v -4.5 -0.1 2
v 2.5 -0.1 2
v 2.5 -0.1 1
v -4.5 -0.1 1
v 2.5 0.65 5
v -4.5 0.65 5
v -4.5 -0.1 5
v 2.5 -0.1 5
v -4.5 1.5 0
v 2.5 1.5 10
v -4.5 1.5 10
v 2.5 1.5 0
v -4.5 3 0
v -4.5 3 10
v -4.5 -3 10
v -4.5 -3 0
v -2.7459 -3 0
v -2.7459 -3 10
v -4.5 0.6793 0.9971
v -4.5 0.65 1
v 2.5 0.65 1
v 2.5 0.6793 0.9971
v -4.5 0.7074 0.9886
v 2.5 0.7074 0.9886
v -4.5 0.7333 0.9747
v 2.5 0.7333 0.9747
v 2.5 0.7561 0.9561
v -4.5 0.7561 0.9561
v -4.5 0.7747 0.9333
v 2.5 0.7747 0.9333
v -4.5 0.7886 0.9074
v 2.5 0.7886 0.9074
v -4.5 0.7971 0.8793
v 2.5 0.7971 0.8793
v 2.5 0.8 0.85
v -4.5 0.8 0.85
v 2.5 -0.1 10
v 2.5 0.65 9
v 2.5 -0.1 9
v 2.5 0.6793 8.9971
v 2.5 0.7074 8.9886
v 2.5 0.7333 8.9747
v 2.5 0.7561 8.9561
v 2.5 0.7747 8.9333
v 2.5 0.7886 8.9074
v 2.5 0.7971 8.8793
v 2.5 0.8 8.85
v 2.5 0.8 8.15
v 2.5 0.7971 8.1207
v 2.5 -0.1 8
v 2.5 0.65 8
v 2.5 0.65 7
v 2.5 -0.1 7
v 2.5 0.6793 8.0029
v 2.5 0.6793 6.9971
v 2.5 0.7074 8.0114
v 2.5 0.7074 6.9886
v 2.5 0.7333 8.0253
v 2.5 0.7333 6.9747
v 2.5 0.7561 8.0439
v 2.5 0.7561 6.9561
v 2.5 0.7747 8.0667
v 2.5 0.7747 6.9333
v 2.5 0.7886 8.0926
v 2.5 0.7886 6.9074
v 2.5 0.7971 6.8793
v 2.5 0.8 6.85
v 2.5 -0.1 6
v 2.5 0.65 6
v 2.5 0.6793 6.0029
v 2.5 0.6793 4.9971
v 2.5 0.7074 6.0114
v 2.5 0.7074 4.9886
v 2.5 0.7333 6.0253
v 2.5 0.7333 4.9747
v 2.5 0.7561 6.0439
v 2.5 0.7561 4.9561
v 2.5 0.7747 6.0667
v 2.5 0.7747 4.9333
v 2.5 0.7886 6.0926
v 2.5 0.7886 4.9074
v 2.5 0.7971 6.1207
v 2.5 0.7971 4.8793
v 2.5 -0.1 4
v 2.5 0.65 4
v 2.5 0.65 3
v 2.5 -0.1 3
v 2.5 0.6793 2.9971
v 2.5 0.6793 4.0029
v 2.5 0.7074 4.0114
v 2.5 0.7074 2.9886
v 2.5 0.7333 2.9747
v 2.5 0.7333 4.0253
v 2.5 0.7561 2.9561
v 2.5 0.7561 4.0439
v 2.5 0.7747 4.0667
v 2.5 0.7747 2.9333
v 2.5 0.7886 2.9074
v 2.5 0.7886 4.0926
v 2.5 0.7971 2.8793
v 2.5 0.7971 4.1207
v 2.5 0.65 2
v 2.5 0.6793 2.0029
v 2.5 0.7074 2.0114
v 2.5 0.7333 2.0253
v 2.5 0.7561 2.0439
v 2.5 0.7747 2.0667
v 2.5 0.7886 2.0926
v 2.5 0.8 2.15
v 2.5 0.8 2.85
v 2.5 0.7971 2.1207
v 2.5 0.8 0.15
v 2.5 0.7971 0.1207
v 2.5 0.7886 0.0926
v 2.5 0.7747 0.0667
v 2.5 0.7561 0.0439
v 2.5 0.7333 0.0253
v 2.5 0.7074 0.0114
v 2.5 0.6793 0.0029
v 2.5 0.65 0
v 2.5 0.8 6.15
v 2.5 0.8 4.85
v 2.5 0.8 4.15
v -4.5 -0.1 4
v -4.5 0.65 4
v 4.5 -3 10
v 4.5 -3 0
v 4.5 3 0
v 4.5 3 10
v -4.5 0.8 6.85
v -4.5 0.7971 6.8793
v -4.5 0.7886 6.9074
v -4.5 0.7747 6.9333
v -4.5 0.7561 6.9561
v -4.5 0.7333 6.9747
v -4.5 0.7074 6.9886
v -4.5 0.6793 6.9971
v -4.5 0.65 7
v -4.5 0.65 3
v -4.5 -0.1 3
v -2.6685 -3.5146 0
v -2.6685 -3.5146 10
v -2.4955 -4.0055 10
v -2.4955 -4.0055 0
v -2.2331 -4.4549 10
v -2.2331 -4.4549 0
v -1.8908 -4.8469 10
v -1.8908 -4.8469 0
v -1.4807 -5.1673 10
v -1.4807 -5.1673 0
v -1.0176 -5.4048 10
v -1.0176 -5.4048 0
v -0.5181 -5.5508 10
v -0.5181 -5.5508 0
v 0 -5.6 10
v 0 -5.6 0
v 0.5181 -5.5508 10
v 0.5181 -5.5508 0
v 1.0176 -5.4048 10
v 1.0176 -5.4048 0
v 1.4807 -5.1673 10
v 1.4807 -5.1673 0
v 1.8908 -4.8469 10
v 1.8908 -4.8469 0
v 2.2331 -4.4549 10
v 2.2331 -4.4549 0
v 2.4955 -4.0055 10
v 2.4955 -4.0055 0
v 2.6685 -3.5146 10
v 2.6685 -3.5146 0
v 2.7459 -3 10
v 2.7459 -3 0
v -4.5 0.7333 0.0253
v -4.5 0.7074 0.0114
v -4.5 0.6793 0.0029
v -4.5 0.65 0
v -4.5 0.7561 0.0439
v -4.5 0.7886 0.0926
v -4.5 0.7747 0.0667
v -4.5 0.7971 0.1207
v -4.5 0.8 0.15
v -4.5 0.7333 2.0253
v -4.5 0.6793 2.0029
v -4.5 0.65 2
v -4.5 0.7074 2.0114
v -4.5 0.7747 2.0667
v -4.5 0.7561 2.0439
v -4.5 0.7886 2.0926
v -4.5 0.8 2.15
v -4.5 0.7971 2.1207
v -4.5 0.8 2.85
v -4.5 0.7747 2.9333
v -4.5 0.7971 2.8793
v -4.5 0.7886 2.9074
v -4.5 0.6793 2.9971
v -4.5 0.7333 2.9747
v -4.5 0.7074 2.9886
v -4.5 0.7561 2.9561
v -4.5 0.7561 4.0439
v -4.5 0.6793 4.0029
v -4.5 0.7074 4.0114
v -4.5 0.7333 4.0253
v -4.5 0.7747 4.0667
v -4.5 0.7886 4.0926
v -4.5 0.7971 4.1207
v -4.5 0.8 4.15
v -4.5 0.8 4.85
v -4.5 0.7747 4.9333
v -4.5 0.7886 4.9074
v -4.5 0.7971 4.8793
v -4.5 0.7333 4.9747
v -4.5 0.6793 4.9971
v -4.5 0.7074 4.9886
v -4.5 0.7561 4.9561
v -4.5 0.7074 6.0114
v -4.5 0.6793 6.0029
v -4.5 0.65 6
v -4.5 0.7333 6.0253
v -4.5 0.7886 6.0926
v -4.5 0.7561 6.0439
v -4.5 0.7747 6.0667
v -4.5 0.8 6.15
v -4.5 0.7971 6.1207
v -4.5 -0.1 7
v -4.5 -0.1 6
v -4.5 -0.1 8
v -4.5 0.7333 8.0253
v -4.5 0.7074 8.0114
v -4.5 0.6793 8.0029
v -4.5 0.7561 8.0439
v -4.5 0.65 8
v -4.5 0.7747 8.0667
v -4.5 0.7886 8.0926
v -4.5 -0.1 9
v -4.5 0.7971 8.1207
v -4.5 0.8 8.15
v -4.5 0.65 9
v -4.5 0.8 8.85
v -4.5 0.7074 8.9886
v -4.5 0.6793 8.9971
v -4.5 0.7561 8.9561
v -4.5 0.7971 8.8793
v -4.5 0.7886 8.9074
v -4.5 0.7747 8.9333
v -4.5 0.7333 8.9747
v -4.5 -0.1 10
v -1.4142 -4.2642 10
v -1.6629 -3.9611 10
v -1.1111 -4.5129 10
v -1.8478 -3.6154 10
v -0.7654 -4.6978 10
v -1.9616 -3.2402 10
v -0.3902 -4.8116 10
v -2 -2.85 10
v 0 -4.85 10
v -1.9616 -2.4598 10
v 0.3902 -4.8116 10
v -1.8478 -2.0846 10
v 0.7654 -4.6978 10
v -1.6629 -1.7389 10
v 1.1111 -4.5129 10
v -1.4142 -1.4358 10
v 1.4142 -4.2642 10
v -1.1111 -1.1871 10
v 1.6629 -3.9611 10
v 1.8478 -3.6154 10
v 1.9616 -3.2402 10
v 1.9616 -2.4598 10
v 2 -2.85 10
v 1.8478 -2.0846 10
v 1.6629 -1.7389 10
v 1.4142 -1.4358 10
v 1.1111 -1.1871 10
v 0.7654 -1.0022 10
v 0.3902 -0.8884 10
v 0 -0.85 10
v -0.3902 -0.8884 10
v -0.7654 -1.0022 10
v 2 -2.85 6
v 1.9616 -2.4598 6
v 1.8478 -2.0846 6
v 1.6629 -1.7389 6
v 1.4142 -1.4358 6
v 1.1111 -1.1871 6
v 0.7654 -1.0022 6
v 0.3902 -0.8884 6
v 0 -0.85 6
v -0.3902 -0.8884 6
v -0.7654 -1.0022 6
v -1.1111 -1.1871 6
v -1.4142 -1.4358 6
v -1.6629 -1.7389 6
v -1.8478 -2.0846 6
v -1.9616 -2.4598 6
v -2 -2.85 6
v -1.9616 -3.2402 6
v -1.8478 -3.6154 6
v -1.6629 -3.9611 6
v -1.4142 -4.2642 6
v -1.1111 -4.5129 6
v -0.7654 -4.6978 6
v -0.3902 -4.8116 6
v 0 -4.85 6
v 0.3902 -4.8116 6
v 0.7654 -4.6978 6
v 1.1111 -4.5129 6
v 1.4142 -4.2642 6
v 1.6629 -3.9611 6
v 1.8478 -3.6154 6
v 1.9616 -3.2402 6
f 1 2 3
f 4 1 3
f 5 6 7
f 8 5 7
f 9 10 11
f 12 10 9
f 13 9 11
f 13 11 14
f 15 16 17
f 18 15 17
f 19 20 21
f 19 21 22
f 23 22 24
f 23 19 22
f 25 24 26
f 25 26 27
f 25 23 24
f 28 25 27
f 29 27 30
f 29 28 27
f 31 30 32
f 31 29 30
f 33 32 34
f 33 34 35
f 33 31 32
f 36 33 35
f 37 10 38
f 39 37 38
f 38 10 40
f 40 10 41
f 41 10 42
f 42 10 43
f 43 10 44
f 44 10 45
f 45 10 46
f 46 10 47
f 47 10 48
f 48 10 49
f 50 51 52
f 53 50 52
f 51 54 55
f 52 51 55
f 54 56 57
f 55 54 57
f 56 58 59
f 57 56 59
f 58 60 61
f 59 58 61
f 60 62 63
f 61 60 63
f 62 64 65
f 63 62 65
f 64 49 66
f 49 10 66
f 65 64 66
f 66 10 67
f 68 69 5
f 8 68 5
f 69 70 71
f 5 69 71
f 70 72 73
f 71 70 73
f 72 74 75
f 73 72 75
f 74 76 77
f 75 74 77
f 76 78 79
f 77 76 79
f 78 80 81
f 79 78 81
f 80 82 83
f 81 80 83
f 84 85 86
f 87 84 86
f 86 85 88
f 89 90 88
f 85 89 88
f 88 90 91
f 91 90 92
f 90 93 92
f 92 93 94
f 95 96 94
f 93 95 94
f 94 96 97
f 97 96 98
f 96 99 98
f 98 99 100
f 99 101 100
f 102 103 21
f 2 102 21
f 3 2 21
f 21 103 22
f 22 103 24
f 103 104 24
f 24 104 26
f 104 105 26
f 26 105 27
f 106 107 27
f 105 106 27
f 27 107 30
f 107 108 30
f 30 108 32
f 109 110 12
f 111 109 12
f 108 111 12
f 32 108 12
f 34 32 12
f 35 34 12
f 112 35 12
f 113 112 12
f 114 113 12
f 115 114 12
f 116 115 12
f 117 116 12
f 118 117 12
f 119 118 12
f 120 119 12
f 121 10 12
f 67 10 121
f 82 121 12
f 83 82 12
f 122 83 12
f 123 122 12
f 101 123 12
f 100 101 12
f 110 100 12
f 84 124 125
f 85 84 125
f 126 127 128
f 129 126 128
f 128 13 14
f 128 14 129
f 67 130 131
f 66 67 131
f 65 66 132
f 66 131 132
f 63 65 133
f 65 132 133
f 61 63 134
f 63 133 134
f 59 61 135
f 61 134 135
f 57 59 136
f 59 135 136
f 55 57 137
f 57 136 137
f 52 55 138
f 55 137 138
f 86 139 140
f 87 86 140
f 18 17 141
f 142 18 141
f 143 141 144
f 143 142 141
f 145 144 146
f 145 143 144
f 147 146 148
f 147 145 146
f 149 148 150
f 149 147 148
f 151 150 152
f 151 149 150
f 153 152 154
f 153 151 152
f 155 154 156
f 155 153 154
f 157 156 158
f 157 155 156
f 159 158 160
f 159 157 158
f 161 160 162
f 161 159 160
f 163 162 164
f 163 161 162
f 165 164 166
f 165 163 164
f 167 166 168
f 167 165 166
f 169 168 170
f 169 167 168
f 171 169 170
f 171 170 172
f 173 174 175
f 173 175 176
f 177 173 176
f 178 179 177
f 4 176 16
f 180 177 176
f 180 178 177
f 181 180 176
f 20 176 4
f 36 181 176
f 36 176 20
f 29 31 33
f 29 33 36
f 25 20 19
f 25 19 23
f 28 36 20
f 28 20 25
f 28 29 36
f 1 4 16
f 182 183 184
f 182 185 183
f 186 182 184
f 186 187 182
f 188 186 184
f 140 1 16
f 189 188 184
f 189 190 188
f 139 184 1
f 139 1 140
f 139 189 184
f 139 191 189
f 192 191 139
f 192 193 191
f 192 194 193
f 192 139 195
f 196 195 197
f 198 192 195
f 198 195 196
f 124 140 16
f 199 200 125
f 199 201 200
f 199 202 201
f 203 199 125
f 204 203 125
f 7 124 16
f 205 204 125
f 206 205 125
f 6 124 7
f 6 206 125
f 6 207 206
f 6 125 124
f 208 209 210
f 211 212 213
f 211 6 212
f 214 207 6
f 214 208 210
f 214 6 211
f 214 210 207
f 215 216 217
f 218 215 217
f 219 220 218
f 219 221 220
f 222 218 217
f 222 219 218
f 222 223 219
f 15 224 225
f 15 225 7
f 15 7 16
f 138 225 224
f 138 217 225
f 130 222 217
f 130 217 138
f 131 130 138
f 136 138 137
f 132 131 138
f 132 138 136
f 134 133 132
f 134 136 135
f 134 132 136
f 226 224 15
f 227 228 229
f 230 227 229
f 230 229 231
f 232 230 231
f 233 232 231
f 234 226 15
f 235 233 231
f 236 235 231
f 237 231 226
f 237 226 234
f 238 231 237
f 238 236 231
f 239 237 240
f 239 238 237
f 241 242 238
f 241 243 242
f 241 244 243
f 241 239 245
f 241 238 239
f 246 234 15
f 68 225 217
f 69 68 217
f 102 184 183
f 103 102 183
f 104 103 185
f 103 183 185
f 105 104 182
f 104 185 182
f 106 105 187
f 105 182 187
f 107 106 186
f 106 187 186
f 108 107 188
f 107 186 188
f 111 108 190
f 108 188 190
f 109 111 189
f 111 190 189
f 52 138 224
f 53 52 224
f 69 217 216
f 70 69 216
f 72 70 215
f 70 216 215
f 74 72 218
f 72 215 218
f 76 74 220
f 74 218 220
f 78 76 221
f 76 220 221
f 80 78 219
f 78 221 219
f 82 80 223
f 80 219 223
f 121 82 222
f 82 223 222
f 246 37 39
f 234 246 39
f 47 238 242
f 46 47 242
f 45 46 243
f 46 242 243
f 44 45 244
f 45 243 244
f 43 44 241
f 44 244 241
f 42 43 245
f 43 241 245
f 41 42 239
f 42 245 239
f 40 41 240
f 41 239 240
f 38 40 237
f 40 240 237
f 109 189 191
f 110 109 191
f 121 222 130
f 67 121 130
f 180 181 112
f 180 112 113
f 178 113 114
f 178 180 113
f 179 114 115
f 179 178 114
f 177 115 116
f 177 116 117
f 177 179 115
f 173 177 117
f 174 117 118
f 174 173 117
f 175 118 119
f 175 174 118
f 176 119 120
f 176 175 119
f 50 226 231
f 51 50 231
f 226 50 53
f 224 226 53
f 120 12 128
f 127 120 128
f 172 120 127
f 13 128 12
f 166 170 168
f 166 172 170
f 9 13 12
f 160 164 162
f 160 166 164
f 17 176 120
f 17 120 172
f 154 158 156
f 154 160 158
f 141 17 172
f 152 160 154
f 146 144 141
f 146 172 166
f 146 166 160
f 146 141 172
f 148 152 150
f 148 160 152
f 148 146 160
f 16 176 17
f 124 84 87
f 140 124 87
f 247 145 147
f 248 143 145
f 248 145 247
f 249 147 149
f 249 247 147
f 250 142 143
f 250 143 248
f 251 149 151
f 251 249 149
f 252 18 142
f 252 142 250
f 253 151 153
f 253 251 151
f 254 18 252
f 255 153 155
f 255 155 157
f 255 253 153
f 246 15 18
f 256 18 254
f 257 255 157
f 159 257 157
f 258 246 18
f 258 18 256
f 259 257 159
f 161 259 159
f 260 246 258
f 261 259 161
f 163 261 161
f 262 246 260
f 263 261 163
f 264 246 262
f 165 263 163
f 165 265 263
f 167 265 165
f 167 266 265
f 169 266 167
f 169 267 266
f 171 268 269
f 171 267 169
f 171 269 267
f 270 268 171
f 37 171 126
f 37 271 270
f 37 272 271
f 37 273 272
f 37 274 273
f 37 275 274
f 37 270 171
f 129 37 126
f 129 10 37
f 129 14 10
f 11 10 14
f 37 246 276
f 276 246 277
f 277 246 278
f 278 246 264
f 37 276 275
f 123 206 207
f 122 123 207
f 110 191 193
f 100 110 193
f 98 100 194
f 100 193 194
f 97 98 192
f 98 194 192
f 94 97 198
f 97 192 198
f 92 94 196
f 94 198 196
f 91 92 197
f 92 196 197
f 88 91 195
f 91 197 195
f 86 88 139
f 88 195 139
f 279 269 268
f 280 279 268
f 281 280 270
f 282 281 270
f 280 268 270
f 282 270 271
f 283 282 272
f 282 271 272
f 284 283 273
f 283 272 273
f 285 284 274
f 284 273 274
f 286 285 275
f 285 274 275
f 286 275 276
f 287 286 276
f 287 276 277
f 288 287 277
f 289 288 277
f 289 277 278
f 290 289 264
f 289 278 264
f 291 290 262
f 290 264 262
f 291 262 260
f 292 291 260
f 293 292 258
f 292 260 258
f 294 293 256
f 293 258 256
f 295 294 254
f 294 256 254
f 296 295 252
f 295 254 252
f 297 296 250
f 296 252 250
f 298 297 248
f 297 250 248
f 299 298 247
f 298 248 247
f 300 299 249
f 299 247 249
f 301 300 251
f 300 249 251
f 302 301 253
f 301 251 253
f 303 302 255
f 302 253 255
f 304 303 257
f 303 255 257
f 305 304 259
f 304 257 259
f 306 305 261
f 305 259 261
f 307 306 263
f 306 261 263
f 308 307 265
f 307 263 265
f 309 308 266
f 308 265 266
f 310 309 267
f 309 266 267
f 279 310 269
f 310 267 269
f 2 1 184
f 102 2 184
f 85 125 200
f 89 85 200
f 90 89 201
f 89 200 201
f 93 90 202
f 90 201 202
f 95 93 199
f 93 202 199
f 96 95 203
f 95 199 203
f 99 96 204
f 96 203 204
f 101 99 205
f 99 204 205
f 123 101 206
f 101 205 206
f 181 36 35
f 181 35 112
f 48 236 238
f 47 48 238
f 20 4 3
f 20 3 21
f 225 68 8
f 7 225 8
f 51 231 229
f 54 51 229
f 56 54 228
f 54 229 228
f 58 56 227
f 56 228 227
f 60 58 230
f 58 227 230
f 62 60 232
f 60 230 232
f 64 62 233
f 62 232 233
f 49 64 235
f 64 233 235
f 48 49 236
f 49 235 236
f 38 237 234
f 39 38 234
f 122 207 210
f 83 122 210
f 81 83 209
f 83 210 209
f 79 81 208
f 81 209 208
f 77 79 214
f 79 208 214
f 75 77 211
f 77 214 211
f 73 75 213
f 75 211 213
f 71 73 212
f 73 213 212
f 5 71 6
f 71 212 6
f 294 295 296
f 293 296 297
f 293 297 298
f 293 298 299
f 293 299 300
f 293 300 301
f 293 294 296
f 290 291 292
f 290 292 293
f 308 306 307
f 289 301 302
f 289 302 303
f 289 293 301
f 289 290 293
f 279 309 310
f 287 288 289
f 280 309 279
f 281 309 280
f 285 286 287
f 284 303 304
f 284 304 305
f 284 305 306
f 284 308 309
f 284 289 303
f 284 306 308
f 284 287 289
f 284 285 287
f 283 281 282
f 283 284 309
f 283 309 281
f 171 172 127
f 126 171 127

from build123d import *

# Parameters (mm, degrees)
SKETCH1_W           = 9
SKETCH1_H           = 6
BOSS_EXTRUDE1_DEPTH = 10
CUT_EXTRUDE1_START  = -2
SKETCH2_W           = 10
SKETCH2_H           = 1.6
CUT_EXTRUDE1_DEPTH  = 7
SKETCH3_R           = 2.75
BOSS_EXTRUDE2_DEPTH = 10
SKETCH4_R           = 2
CUT_EXTRUDE2_DEPTH  = 4
BOSS_EXTRUDE3_REACH = 16.573


with BuildPart() as part:
    # Sketch1 → Boss-Extrude1 (new body)
    with BuildSketch(Plane.XY):
        Rectangle(SKETCH1_W, SKETCH1_H)
    extrude(amount=BOSS_EXTRUDE1_DEPTH)

    # Sketch2 → Cut-Extrude1 (cut)
    with BuildSketch(Plane(origin=(4.5, 0, 0), x_dir=(0, 0, -1), z_dir=(1, 0, 0)).offset(CUT_EXTRUDE1_START)):
        with Locations((-5, 0.7)):
            Rectangle(SKETCH2_W, SKETCH2_H)
    extrude(amount=-CUT_EXTRUDE1_DEPTH, mode=Mode.SUBTRACT)

    # Sketch3 → Boss-Extrude2 (add, through all)
    with BuildSketch(Plane.XY.offset(10)):
        with Locations((0, -2.85)):
            Circle(SKETCH3_R)
    extrude(amount=-BOSS_EXTRUDE2_DEPTH)

    # Sketch4 → Cut-Extrude2 (cut)
    with BuildSketch(Plane.XY.offset(10)):
        with Locations((0, -2.85)):
            Circle(SKETCH4_R)
    extrude(amount=-CUT_EXTRUDE2_DEPTH, mode=Mode.SUBTRACT)

    # Sketch5 → Boss-Extrude3 (add, up to next)
    with BuildSketch(Plane.ZY.offset(4.5), mode=Mode.PRIVATE) as boss_extrude3_sk1:
        with BuildLine():
            Line((0, -0.1), (1, -0.1))
            Line((1, -0.1), (1, 0.65))
            ThreePointArc((1, 0.65), (0.956066017, 0.756066017), (0.85, 0.8))
            Line((0.85, 0.8), (0.15, 0.8))
            ThreePointArc((0.15, 0.8), (0.043933983, 0.756066017), (0, 0.65))
            Line((0, 0.65), (0, -0.1))
        make_face()
    boss_extrude3_tool1 = extrude(boss_extrude3_sk1.sketch, amount=-BOSS_EXTRUDE3_REACH, mode=Mode.PRIVATE) - part.part
    # Sketch5 → Boss-Extrude3 (add, up to next)
    with BuildSketch(Plane.ZY.offset(4.5), mode=Mode.PRIVATE) as boss_extrude3_sk2:
        with BuildLine():
            Line((2, -0.1), (2, 0.65))
            ThreePointArc((2, 0.65), (2.043933983, 0.756066017), (2.15, 0.8))
            Line((2.15, 0.8), (2.85, 0.8))
            ThreePointArc((2.85, 0.8), (2.956066017, 0.756066017), (3, 0.65))
            Line((3, 0.65), (3, -0.1))
            Line((3, -0.1), (2, -0.1))
        make_face()
    boss_extrude3_tool2 = extrude(boss_extrude3_sk2.sketch, amount=-BOSS_EXTRUDE3_REACH, mode=Mode.PRIVATE) - part.part
    # Sketch5 → Boss-Extrude3 (add, up to next)
    with BuildSketch(Plane.ZY.offset(4.5), mode=Mode.PRIVATE) as boss_extrude3_sk3:
        with BuildLine():
            Line((4, -0.1), (4, 0.65))
            ThreePointArc((4, 0.65), (4.043933983, 0.756066017), (4.15, 0.8))
            Line((4.15, 0.8), (4.85, 0.8))
            ThreePointArc((4.85, 0.8), (4.956066017, 0.756066017), (5, 0.65))
            Line((5, 0.65), (5, -0.1))
            Line((5, -0.1), (4, -0.1))
        make_face()
    boss_extrude3_tool3 = extrude(boss_extrude3_sk3.sketch, amount=-BOSS_EXTRUDE3_REACH, mode=Mode.PRIVATE) - part.part
    # Sketch5 → Boss-Extrude3 (add, up to next)
    with BuildSketch(Plane.ZY.offset(4.5), mode=Mode.PRIVATE) as boss_extrude3_sk4:
        with BuildLine():
            Line((6, -0.1), (6, 0.65))
            ThreePointArc((6, 0.65), (6.043933983, 0.756066017), (6.15, 0.8))
            Line((6.15, 0.8), (6.85, 0.8))
            ThreePointArc((6.85, 0.8), (6.956066017, 0.756066017), (7, 0.65))
            Line((7, 0.65), (7, -0.1))
            Line((7, -0.1), (6, -0.1))
        make_face()
    boss_extrude3_tool4 = extrude(boss_extrude3_sk4.sketch, amount=-BOSS_EXTRUDE3_REACH, mode=Mode.PRIVATE) - part.part
    # Sketch5 → Boss-Extrude3 (add, up to next)
    with BuildSketch(Plane.ZY.offset(4.5), mode=Mode.PRIVATE) as boss_extrude3_sk5:
        with BuildLine():
            Line((8, -0.1), (8, 0.65))
            ThreePointArc((8, 0.65), (8.043933983, 0.756066017), (8.15, 0.8))
            Line((8.15, 0.8), (8.85, 0.8))
            ThreePointArc((8.85, 0.8), (8.956066017, 0.756066017), (9, 0.65))
            Line((9, 0.65), (9, -0.1))
            Line((9, -0.1), (8, -0.1))
        make_face()
    boss_extrude3_tool5 = extrude(boss_extrude3_sk5.sketch, amount=-BOSS_EXTRUDE3_REACH, mode=Mode.PRIVATE) - part.part
    add(boss_extrude3_tool1.solids().sort_by_distance((-4.5, 0.345482, 0.5))[0])
    add(boss_extrude3_tool2.solids().sort_by_distance((-4.5, 0.345482, 2.5))[0])
    add(boss_extrude3_tool3.solids().sort_by_distance((-4.5, 0.345482, 4.5))[0])
    add(boss_extrude3_tool4.solids().sort_by_distance((-4.5, 0.345482, 6.5))[0])
    add(boss_extrude3_tool5.solids().sort_by_distance((-4.5, 0.345482, 8.5))[0])


solid = part.part
